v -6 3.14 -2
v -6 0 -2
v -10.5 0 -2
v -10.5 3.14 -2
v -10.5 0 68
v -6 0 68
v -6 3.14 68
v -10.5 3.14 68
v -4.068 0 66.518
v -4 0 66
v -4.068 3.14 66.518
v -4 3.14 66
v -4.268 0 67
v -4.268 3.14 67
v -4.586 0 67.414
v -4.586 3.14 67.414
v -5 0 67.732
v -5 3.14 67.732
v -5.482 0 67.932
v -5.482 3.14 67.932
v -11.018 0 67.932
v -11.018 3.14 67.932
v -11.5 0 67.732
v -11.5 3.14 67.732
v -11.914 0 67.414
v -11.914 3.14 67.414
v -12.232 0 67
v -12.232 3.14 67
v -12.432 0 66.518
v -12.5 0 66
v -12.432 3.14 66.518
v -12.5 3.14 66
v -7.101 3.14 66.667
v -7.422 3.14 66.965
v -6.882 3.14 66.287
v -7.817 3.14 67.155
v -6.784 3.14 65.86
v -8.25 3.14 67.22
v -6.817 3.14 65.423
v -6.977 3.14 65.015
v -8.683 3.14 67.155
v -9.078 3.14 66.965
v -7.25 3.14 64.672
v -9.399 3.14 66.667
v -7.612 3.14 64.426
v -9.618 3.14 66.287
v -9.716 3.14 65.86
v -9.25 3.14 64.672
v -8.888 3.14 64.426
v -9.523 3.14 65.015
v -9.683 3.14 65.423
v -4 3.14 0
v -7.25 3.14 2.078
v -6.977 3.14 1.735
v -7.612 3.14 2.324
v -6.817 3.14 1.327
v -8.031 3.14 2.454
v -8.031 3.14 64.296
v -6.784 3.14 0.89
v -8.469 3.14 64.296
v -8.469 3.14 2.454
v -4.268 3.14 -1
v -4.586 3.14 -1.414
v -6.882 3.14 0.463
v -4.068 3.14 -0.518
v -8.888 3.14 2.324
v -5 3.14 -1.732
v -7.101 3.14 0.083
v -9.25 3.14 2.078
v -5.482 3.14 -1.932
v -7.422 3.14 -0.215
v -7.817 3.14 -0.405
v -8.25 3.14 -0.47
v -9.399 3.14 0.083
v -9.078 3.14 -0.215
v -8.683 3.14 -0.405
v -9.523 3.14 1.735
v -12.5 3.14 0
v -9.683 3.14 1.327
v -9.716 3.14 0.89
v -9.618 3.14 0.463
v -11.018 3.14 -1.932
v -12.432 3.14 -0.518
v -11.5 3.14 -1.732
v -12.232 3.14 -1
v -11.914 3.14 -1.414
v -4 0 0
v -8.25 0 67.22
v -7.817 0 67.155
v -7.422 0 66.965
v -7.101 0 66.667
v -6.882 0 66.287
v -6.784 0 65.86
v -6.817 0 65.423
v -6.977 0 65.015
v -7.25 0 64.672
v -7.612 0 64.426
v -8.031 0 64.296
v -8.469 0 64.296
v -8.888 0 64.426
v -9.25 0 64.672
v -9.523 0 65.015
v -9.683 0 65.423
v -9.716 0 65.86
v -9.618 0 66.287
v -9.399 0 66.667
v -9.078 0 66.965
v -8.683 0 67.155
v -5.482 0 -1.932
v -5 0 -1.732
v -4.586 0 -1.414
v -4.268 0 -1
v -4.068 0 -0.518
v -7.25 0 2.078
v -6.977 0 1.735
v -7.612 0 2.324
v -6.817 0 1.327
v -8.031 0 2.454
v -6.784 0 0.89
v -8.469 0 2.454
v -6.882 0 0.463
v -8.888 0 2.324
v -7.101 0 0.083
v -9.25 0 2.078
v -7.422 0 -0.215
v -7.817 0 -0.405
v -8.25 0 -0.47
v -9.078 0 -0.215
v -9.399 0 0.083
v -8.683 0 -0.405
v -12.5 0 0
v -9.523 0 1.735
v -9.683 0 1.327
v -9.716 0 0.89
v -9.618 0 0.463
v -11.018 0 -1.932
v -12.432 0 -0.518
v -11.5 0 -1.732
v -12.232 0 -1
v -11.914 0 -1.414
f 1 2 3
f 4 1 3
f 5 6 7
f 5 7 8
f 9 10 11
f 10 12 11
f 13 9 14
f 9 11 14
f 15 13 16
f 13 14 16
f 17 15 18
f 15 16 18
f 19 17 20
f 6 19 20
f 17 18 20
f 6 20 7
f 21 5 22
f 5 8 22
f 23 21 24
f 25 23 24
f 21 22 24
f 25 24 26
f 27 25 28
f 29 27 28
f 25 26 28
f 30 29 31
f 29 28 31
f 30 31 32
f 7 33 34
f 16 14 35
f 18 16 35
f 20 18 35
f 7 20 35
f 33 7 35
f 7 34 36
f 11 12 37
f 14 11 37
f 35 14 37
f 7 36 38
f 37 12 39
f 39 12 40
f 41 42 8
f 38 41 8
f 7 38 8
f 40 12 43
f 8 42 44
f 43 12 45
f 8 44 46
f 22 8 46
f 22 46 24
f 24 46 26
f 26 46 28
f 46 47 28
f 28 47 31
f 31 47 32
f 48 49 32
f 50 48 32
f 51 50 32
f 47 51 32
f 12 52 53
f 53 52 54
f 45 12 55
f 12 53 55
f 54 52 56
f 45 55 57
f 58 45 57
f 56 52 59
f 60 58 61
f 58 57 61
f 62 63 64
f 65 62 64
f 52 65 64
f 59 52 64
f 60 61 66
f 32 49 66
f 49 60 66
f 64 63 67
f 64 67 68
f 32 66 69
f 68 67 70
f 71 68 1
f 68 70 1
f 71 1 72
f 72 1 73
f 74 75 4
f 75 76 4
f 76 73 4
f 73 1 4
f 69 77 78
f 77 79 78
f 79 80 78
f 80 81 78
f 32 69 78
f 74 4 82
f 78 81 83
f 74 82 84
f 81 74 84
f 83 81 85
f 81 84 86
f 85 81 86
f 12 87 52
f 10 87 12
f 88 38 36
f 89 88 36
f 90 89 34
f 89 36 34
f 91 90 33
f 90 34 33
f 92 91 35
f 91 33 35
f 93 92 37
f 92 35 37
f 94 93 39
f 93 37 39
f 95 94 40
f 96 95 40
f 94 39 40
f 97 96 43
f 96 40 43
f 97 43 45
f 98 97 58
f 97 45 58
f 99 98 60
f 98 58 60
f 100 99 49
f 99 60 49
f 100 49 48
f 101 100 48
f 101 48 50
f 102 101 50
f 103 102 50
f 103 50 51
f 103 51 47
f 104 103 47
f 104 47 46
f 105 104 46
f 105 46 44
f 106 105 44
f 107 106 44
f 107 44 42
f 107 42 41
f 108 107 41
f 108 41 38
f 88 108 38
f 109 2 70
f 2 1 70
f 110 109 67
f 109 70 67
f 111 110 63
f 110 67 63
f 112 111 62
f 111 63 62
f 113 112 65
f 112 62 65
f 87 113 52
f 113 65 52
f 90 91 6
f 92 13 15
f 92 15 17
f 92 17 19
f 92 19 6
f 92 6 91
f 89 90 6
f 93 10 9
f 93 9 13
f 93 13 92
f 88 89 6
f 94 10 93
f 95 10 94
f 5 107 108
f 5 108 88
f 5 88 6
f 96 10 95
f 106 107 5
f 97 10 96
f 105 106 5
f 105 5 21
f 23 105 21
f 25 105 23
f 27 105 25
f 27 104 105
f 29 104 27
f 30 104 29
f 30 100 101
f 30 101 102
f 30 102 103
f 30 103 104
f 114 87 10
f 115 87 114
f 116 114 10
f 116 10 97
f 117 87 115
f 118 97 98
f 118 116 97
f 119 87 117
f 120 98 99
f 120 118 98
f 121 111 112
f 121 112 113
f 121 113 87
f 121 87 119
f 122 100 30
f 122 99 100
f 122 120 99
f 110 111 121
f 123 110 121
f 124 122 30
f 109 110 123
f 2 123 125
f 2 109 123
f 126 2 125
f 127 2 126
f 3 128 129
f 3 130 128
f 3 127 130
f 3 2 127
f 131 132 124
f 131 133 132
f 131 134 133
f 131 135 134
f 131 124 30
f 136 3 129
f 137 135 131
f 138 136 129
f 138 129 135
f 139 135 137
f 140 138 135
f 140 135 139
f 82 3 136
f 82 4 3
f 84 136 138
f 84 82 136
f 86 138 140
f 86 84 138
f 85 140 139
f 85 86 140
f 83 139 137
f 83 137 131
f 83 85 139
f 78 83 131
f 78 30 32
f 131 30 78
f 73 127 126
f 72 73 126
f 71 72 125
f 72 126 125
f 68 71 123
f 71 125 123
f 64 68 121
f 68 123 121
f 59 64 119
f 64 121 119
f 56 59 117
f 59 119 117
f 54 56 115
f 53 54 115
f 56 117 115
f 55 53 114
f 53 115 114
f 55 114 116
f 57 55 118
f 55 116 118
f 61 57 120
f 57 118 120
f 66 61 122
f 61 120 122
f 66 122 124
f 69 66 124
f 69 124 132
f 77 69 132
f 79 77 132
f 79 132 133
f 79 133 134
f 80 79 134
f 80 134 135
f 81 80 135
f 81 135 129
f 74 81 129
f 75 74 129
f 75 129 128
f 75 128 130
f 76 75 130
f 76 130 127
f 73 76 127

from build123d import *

# Parameters (mm, degrees)
BOSS_EXTRUDE1_DEPTH = 3.14
SKETCH7_R           = 1.47
CUT_EXTRUDE1_DEPTH  = 70.210617683
SKETCH8_W           = 16.5
SKETCH8_H           = 4
CUT_EXTRUDE2_DEPTH  = 70.210617683
FILLET1_R           = 2
SKETCH9_R           = 1.47
CUT_EXTRUDE3_DEPTH  = 70.210617683


with BuildPart() as part:
    # Sketch1 → Boss-Extrude1 (new body)
    with BuildSketch(Plane(origin=(0, 0, 0), x_dir=(1, 0, 0), z_dir=(0, 1, 0))):
        Polygon((12.5, 2), (12.5, -2), (-4, -2), (-4, -68), (-12.5, -68), (-12.5, 2), (-8.5, 2), align=None)
    extrude(amount=BOSS_EXTRUDE1_DEPTH)

    # Sketch7 → Cut-Extrude1 (cut, through all)
    with BuildSketch(Plane(origin=(0, 3.14, 0), x_dir=(1, 0, 0), z_dir=(0, 1, 0))):
        with Locations(Location((-8.25, -65.75, 0), (0, 0, 270))):
            Circle(SKETCH7_R)
    extrude(amount=-CUT_EXTRUDE1_DEPTH, mode=Mode.SUBTRACT)

    # Sketch8 → Cut-Extrude2 (cut, through all)
    with BuildSketch(Plane.XZ):
        with Locations((4.25, 0)):
            Rectangle(SKETCH8_W, SKETCH8_H)
    extrude(amount=-CUT_EXTRUDE2_DEPTH, mode=Mode.SUBTRACT)

    # Fillet1
    fillet1_edges = [part.edges().sort_by_distance(p)[0] for p in [
        (-4, 1.57, 68),
        (-12.5, 1.57, 68),
        (-12.5, 1.57, -2),
        (-4, 1.57, -2),
    ]]
    fillet(fillet1_edges, radius=FILLET1_R)

    # Sketch9 → Cut-Extrude3 (cut, through all)
    with BuildSketch(Plane.XZ):
        with Locations(Location((-8.25, 1, 0), (0, 0, 270))):
            Circle(SKETCH9_R)
    extrude(amount=-CUT_EXTRUDE3_DEPTH, mode=Mode.SUBTRACT)


solid = part.part
